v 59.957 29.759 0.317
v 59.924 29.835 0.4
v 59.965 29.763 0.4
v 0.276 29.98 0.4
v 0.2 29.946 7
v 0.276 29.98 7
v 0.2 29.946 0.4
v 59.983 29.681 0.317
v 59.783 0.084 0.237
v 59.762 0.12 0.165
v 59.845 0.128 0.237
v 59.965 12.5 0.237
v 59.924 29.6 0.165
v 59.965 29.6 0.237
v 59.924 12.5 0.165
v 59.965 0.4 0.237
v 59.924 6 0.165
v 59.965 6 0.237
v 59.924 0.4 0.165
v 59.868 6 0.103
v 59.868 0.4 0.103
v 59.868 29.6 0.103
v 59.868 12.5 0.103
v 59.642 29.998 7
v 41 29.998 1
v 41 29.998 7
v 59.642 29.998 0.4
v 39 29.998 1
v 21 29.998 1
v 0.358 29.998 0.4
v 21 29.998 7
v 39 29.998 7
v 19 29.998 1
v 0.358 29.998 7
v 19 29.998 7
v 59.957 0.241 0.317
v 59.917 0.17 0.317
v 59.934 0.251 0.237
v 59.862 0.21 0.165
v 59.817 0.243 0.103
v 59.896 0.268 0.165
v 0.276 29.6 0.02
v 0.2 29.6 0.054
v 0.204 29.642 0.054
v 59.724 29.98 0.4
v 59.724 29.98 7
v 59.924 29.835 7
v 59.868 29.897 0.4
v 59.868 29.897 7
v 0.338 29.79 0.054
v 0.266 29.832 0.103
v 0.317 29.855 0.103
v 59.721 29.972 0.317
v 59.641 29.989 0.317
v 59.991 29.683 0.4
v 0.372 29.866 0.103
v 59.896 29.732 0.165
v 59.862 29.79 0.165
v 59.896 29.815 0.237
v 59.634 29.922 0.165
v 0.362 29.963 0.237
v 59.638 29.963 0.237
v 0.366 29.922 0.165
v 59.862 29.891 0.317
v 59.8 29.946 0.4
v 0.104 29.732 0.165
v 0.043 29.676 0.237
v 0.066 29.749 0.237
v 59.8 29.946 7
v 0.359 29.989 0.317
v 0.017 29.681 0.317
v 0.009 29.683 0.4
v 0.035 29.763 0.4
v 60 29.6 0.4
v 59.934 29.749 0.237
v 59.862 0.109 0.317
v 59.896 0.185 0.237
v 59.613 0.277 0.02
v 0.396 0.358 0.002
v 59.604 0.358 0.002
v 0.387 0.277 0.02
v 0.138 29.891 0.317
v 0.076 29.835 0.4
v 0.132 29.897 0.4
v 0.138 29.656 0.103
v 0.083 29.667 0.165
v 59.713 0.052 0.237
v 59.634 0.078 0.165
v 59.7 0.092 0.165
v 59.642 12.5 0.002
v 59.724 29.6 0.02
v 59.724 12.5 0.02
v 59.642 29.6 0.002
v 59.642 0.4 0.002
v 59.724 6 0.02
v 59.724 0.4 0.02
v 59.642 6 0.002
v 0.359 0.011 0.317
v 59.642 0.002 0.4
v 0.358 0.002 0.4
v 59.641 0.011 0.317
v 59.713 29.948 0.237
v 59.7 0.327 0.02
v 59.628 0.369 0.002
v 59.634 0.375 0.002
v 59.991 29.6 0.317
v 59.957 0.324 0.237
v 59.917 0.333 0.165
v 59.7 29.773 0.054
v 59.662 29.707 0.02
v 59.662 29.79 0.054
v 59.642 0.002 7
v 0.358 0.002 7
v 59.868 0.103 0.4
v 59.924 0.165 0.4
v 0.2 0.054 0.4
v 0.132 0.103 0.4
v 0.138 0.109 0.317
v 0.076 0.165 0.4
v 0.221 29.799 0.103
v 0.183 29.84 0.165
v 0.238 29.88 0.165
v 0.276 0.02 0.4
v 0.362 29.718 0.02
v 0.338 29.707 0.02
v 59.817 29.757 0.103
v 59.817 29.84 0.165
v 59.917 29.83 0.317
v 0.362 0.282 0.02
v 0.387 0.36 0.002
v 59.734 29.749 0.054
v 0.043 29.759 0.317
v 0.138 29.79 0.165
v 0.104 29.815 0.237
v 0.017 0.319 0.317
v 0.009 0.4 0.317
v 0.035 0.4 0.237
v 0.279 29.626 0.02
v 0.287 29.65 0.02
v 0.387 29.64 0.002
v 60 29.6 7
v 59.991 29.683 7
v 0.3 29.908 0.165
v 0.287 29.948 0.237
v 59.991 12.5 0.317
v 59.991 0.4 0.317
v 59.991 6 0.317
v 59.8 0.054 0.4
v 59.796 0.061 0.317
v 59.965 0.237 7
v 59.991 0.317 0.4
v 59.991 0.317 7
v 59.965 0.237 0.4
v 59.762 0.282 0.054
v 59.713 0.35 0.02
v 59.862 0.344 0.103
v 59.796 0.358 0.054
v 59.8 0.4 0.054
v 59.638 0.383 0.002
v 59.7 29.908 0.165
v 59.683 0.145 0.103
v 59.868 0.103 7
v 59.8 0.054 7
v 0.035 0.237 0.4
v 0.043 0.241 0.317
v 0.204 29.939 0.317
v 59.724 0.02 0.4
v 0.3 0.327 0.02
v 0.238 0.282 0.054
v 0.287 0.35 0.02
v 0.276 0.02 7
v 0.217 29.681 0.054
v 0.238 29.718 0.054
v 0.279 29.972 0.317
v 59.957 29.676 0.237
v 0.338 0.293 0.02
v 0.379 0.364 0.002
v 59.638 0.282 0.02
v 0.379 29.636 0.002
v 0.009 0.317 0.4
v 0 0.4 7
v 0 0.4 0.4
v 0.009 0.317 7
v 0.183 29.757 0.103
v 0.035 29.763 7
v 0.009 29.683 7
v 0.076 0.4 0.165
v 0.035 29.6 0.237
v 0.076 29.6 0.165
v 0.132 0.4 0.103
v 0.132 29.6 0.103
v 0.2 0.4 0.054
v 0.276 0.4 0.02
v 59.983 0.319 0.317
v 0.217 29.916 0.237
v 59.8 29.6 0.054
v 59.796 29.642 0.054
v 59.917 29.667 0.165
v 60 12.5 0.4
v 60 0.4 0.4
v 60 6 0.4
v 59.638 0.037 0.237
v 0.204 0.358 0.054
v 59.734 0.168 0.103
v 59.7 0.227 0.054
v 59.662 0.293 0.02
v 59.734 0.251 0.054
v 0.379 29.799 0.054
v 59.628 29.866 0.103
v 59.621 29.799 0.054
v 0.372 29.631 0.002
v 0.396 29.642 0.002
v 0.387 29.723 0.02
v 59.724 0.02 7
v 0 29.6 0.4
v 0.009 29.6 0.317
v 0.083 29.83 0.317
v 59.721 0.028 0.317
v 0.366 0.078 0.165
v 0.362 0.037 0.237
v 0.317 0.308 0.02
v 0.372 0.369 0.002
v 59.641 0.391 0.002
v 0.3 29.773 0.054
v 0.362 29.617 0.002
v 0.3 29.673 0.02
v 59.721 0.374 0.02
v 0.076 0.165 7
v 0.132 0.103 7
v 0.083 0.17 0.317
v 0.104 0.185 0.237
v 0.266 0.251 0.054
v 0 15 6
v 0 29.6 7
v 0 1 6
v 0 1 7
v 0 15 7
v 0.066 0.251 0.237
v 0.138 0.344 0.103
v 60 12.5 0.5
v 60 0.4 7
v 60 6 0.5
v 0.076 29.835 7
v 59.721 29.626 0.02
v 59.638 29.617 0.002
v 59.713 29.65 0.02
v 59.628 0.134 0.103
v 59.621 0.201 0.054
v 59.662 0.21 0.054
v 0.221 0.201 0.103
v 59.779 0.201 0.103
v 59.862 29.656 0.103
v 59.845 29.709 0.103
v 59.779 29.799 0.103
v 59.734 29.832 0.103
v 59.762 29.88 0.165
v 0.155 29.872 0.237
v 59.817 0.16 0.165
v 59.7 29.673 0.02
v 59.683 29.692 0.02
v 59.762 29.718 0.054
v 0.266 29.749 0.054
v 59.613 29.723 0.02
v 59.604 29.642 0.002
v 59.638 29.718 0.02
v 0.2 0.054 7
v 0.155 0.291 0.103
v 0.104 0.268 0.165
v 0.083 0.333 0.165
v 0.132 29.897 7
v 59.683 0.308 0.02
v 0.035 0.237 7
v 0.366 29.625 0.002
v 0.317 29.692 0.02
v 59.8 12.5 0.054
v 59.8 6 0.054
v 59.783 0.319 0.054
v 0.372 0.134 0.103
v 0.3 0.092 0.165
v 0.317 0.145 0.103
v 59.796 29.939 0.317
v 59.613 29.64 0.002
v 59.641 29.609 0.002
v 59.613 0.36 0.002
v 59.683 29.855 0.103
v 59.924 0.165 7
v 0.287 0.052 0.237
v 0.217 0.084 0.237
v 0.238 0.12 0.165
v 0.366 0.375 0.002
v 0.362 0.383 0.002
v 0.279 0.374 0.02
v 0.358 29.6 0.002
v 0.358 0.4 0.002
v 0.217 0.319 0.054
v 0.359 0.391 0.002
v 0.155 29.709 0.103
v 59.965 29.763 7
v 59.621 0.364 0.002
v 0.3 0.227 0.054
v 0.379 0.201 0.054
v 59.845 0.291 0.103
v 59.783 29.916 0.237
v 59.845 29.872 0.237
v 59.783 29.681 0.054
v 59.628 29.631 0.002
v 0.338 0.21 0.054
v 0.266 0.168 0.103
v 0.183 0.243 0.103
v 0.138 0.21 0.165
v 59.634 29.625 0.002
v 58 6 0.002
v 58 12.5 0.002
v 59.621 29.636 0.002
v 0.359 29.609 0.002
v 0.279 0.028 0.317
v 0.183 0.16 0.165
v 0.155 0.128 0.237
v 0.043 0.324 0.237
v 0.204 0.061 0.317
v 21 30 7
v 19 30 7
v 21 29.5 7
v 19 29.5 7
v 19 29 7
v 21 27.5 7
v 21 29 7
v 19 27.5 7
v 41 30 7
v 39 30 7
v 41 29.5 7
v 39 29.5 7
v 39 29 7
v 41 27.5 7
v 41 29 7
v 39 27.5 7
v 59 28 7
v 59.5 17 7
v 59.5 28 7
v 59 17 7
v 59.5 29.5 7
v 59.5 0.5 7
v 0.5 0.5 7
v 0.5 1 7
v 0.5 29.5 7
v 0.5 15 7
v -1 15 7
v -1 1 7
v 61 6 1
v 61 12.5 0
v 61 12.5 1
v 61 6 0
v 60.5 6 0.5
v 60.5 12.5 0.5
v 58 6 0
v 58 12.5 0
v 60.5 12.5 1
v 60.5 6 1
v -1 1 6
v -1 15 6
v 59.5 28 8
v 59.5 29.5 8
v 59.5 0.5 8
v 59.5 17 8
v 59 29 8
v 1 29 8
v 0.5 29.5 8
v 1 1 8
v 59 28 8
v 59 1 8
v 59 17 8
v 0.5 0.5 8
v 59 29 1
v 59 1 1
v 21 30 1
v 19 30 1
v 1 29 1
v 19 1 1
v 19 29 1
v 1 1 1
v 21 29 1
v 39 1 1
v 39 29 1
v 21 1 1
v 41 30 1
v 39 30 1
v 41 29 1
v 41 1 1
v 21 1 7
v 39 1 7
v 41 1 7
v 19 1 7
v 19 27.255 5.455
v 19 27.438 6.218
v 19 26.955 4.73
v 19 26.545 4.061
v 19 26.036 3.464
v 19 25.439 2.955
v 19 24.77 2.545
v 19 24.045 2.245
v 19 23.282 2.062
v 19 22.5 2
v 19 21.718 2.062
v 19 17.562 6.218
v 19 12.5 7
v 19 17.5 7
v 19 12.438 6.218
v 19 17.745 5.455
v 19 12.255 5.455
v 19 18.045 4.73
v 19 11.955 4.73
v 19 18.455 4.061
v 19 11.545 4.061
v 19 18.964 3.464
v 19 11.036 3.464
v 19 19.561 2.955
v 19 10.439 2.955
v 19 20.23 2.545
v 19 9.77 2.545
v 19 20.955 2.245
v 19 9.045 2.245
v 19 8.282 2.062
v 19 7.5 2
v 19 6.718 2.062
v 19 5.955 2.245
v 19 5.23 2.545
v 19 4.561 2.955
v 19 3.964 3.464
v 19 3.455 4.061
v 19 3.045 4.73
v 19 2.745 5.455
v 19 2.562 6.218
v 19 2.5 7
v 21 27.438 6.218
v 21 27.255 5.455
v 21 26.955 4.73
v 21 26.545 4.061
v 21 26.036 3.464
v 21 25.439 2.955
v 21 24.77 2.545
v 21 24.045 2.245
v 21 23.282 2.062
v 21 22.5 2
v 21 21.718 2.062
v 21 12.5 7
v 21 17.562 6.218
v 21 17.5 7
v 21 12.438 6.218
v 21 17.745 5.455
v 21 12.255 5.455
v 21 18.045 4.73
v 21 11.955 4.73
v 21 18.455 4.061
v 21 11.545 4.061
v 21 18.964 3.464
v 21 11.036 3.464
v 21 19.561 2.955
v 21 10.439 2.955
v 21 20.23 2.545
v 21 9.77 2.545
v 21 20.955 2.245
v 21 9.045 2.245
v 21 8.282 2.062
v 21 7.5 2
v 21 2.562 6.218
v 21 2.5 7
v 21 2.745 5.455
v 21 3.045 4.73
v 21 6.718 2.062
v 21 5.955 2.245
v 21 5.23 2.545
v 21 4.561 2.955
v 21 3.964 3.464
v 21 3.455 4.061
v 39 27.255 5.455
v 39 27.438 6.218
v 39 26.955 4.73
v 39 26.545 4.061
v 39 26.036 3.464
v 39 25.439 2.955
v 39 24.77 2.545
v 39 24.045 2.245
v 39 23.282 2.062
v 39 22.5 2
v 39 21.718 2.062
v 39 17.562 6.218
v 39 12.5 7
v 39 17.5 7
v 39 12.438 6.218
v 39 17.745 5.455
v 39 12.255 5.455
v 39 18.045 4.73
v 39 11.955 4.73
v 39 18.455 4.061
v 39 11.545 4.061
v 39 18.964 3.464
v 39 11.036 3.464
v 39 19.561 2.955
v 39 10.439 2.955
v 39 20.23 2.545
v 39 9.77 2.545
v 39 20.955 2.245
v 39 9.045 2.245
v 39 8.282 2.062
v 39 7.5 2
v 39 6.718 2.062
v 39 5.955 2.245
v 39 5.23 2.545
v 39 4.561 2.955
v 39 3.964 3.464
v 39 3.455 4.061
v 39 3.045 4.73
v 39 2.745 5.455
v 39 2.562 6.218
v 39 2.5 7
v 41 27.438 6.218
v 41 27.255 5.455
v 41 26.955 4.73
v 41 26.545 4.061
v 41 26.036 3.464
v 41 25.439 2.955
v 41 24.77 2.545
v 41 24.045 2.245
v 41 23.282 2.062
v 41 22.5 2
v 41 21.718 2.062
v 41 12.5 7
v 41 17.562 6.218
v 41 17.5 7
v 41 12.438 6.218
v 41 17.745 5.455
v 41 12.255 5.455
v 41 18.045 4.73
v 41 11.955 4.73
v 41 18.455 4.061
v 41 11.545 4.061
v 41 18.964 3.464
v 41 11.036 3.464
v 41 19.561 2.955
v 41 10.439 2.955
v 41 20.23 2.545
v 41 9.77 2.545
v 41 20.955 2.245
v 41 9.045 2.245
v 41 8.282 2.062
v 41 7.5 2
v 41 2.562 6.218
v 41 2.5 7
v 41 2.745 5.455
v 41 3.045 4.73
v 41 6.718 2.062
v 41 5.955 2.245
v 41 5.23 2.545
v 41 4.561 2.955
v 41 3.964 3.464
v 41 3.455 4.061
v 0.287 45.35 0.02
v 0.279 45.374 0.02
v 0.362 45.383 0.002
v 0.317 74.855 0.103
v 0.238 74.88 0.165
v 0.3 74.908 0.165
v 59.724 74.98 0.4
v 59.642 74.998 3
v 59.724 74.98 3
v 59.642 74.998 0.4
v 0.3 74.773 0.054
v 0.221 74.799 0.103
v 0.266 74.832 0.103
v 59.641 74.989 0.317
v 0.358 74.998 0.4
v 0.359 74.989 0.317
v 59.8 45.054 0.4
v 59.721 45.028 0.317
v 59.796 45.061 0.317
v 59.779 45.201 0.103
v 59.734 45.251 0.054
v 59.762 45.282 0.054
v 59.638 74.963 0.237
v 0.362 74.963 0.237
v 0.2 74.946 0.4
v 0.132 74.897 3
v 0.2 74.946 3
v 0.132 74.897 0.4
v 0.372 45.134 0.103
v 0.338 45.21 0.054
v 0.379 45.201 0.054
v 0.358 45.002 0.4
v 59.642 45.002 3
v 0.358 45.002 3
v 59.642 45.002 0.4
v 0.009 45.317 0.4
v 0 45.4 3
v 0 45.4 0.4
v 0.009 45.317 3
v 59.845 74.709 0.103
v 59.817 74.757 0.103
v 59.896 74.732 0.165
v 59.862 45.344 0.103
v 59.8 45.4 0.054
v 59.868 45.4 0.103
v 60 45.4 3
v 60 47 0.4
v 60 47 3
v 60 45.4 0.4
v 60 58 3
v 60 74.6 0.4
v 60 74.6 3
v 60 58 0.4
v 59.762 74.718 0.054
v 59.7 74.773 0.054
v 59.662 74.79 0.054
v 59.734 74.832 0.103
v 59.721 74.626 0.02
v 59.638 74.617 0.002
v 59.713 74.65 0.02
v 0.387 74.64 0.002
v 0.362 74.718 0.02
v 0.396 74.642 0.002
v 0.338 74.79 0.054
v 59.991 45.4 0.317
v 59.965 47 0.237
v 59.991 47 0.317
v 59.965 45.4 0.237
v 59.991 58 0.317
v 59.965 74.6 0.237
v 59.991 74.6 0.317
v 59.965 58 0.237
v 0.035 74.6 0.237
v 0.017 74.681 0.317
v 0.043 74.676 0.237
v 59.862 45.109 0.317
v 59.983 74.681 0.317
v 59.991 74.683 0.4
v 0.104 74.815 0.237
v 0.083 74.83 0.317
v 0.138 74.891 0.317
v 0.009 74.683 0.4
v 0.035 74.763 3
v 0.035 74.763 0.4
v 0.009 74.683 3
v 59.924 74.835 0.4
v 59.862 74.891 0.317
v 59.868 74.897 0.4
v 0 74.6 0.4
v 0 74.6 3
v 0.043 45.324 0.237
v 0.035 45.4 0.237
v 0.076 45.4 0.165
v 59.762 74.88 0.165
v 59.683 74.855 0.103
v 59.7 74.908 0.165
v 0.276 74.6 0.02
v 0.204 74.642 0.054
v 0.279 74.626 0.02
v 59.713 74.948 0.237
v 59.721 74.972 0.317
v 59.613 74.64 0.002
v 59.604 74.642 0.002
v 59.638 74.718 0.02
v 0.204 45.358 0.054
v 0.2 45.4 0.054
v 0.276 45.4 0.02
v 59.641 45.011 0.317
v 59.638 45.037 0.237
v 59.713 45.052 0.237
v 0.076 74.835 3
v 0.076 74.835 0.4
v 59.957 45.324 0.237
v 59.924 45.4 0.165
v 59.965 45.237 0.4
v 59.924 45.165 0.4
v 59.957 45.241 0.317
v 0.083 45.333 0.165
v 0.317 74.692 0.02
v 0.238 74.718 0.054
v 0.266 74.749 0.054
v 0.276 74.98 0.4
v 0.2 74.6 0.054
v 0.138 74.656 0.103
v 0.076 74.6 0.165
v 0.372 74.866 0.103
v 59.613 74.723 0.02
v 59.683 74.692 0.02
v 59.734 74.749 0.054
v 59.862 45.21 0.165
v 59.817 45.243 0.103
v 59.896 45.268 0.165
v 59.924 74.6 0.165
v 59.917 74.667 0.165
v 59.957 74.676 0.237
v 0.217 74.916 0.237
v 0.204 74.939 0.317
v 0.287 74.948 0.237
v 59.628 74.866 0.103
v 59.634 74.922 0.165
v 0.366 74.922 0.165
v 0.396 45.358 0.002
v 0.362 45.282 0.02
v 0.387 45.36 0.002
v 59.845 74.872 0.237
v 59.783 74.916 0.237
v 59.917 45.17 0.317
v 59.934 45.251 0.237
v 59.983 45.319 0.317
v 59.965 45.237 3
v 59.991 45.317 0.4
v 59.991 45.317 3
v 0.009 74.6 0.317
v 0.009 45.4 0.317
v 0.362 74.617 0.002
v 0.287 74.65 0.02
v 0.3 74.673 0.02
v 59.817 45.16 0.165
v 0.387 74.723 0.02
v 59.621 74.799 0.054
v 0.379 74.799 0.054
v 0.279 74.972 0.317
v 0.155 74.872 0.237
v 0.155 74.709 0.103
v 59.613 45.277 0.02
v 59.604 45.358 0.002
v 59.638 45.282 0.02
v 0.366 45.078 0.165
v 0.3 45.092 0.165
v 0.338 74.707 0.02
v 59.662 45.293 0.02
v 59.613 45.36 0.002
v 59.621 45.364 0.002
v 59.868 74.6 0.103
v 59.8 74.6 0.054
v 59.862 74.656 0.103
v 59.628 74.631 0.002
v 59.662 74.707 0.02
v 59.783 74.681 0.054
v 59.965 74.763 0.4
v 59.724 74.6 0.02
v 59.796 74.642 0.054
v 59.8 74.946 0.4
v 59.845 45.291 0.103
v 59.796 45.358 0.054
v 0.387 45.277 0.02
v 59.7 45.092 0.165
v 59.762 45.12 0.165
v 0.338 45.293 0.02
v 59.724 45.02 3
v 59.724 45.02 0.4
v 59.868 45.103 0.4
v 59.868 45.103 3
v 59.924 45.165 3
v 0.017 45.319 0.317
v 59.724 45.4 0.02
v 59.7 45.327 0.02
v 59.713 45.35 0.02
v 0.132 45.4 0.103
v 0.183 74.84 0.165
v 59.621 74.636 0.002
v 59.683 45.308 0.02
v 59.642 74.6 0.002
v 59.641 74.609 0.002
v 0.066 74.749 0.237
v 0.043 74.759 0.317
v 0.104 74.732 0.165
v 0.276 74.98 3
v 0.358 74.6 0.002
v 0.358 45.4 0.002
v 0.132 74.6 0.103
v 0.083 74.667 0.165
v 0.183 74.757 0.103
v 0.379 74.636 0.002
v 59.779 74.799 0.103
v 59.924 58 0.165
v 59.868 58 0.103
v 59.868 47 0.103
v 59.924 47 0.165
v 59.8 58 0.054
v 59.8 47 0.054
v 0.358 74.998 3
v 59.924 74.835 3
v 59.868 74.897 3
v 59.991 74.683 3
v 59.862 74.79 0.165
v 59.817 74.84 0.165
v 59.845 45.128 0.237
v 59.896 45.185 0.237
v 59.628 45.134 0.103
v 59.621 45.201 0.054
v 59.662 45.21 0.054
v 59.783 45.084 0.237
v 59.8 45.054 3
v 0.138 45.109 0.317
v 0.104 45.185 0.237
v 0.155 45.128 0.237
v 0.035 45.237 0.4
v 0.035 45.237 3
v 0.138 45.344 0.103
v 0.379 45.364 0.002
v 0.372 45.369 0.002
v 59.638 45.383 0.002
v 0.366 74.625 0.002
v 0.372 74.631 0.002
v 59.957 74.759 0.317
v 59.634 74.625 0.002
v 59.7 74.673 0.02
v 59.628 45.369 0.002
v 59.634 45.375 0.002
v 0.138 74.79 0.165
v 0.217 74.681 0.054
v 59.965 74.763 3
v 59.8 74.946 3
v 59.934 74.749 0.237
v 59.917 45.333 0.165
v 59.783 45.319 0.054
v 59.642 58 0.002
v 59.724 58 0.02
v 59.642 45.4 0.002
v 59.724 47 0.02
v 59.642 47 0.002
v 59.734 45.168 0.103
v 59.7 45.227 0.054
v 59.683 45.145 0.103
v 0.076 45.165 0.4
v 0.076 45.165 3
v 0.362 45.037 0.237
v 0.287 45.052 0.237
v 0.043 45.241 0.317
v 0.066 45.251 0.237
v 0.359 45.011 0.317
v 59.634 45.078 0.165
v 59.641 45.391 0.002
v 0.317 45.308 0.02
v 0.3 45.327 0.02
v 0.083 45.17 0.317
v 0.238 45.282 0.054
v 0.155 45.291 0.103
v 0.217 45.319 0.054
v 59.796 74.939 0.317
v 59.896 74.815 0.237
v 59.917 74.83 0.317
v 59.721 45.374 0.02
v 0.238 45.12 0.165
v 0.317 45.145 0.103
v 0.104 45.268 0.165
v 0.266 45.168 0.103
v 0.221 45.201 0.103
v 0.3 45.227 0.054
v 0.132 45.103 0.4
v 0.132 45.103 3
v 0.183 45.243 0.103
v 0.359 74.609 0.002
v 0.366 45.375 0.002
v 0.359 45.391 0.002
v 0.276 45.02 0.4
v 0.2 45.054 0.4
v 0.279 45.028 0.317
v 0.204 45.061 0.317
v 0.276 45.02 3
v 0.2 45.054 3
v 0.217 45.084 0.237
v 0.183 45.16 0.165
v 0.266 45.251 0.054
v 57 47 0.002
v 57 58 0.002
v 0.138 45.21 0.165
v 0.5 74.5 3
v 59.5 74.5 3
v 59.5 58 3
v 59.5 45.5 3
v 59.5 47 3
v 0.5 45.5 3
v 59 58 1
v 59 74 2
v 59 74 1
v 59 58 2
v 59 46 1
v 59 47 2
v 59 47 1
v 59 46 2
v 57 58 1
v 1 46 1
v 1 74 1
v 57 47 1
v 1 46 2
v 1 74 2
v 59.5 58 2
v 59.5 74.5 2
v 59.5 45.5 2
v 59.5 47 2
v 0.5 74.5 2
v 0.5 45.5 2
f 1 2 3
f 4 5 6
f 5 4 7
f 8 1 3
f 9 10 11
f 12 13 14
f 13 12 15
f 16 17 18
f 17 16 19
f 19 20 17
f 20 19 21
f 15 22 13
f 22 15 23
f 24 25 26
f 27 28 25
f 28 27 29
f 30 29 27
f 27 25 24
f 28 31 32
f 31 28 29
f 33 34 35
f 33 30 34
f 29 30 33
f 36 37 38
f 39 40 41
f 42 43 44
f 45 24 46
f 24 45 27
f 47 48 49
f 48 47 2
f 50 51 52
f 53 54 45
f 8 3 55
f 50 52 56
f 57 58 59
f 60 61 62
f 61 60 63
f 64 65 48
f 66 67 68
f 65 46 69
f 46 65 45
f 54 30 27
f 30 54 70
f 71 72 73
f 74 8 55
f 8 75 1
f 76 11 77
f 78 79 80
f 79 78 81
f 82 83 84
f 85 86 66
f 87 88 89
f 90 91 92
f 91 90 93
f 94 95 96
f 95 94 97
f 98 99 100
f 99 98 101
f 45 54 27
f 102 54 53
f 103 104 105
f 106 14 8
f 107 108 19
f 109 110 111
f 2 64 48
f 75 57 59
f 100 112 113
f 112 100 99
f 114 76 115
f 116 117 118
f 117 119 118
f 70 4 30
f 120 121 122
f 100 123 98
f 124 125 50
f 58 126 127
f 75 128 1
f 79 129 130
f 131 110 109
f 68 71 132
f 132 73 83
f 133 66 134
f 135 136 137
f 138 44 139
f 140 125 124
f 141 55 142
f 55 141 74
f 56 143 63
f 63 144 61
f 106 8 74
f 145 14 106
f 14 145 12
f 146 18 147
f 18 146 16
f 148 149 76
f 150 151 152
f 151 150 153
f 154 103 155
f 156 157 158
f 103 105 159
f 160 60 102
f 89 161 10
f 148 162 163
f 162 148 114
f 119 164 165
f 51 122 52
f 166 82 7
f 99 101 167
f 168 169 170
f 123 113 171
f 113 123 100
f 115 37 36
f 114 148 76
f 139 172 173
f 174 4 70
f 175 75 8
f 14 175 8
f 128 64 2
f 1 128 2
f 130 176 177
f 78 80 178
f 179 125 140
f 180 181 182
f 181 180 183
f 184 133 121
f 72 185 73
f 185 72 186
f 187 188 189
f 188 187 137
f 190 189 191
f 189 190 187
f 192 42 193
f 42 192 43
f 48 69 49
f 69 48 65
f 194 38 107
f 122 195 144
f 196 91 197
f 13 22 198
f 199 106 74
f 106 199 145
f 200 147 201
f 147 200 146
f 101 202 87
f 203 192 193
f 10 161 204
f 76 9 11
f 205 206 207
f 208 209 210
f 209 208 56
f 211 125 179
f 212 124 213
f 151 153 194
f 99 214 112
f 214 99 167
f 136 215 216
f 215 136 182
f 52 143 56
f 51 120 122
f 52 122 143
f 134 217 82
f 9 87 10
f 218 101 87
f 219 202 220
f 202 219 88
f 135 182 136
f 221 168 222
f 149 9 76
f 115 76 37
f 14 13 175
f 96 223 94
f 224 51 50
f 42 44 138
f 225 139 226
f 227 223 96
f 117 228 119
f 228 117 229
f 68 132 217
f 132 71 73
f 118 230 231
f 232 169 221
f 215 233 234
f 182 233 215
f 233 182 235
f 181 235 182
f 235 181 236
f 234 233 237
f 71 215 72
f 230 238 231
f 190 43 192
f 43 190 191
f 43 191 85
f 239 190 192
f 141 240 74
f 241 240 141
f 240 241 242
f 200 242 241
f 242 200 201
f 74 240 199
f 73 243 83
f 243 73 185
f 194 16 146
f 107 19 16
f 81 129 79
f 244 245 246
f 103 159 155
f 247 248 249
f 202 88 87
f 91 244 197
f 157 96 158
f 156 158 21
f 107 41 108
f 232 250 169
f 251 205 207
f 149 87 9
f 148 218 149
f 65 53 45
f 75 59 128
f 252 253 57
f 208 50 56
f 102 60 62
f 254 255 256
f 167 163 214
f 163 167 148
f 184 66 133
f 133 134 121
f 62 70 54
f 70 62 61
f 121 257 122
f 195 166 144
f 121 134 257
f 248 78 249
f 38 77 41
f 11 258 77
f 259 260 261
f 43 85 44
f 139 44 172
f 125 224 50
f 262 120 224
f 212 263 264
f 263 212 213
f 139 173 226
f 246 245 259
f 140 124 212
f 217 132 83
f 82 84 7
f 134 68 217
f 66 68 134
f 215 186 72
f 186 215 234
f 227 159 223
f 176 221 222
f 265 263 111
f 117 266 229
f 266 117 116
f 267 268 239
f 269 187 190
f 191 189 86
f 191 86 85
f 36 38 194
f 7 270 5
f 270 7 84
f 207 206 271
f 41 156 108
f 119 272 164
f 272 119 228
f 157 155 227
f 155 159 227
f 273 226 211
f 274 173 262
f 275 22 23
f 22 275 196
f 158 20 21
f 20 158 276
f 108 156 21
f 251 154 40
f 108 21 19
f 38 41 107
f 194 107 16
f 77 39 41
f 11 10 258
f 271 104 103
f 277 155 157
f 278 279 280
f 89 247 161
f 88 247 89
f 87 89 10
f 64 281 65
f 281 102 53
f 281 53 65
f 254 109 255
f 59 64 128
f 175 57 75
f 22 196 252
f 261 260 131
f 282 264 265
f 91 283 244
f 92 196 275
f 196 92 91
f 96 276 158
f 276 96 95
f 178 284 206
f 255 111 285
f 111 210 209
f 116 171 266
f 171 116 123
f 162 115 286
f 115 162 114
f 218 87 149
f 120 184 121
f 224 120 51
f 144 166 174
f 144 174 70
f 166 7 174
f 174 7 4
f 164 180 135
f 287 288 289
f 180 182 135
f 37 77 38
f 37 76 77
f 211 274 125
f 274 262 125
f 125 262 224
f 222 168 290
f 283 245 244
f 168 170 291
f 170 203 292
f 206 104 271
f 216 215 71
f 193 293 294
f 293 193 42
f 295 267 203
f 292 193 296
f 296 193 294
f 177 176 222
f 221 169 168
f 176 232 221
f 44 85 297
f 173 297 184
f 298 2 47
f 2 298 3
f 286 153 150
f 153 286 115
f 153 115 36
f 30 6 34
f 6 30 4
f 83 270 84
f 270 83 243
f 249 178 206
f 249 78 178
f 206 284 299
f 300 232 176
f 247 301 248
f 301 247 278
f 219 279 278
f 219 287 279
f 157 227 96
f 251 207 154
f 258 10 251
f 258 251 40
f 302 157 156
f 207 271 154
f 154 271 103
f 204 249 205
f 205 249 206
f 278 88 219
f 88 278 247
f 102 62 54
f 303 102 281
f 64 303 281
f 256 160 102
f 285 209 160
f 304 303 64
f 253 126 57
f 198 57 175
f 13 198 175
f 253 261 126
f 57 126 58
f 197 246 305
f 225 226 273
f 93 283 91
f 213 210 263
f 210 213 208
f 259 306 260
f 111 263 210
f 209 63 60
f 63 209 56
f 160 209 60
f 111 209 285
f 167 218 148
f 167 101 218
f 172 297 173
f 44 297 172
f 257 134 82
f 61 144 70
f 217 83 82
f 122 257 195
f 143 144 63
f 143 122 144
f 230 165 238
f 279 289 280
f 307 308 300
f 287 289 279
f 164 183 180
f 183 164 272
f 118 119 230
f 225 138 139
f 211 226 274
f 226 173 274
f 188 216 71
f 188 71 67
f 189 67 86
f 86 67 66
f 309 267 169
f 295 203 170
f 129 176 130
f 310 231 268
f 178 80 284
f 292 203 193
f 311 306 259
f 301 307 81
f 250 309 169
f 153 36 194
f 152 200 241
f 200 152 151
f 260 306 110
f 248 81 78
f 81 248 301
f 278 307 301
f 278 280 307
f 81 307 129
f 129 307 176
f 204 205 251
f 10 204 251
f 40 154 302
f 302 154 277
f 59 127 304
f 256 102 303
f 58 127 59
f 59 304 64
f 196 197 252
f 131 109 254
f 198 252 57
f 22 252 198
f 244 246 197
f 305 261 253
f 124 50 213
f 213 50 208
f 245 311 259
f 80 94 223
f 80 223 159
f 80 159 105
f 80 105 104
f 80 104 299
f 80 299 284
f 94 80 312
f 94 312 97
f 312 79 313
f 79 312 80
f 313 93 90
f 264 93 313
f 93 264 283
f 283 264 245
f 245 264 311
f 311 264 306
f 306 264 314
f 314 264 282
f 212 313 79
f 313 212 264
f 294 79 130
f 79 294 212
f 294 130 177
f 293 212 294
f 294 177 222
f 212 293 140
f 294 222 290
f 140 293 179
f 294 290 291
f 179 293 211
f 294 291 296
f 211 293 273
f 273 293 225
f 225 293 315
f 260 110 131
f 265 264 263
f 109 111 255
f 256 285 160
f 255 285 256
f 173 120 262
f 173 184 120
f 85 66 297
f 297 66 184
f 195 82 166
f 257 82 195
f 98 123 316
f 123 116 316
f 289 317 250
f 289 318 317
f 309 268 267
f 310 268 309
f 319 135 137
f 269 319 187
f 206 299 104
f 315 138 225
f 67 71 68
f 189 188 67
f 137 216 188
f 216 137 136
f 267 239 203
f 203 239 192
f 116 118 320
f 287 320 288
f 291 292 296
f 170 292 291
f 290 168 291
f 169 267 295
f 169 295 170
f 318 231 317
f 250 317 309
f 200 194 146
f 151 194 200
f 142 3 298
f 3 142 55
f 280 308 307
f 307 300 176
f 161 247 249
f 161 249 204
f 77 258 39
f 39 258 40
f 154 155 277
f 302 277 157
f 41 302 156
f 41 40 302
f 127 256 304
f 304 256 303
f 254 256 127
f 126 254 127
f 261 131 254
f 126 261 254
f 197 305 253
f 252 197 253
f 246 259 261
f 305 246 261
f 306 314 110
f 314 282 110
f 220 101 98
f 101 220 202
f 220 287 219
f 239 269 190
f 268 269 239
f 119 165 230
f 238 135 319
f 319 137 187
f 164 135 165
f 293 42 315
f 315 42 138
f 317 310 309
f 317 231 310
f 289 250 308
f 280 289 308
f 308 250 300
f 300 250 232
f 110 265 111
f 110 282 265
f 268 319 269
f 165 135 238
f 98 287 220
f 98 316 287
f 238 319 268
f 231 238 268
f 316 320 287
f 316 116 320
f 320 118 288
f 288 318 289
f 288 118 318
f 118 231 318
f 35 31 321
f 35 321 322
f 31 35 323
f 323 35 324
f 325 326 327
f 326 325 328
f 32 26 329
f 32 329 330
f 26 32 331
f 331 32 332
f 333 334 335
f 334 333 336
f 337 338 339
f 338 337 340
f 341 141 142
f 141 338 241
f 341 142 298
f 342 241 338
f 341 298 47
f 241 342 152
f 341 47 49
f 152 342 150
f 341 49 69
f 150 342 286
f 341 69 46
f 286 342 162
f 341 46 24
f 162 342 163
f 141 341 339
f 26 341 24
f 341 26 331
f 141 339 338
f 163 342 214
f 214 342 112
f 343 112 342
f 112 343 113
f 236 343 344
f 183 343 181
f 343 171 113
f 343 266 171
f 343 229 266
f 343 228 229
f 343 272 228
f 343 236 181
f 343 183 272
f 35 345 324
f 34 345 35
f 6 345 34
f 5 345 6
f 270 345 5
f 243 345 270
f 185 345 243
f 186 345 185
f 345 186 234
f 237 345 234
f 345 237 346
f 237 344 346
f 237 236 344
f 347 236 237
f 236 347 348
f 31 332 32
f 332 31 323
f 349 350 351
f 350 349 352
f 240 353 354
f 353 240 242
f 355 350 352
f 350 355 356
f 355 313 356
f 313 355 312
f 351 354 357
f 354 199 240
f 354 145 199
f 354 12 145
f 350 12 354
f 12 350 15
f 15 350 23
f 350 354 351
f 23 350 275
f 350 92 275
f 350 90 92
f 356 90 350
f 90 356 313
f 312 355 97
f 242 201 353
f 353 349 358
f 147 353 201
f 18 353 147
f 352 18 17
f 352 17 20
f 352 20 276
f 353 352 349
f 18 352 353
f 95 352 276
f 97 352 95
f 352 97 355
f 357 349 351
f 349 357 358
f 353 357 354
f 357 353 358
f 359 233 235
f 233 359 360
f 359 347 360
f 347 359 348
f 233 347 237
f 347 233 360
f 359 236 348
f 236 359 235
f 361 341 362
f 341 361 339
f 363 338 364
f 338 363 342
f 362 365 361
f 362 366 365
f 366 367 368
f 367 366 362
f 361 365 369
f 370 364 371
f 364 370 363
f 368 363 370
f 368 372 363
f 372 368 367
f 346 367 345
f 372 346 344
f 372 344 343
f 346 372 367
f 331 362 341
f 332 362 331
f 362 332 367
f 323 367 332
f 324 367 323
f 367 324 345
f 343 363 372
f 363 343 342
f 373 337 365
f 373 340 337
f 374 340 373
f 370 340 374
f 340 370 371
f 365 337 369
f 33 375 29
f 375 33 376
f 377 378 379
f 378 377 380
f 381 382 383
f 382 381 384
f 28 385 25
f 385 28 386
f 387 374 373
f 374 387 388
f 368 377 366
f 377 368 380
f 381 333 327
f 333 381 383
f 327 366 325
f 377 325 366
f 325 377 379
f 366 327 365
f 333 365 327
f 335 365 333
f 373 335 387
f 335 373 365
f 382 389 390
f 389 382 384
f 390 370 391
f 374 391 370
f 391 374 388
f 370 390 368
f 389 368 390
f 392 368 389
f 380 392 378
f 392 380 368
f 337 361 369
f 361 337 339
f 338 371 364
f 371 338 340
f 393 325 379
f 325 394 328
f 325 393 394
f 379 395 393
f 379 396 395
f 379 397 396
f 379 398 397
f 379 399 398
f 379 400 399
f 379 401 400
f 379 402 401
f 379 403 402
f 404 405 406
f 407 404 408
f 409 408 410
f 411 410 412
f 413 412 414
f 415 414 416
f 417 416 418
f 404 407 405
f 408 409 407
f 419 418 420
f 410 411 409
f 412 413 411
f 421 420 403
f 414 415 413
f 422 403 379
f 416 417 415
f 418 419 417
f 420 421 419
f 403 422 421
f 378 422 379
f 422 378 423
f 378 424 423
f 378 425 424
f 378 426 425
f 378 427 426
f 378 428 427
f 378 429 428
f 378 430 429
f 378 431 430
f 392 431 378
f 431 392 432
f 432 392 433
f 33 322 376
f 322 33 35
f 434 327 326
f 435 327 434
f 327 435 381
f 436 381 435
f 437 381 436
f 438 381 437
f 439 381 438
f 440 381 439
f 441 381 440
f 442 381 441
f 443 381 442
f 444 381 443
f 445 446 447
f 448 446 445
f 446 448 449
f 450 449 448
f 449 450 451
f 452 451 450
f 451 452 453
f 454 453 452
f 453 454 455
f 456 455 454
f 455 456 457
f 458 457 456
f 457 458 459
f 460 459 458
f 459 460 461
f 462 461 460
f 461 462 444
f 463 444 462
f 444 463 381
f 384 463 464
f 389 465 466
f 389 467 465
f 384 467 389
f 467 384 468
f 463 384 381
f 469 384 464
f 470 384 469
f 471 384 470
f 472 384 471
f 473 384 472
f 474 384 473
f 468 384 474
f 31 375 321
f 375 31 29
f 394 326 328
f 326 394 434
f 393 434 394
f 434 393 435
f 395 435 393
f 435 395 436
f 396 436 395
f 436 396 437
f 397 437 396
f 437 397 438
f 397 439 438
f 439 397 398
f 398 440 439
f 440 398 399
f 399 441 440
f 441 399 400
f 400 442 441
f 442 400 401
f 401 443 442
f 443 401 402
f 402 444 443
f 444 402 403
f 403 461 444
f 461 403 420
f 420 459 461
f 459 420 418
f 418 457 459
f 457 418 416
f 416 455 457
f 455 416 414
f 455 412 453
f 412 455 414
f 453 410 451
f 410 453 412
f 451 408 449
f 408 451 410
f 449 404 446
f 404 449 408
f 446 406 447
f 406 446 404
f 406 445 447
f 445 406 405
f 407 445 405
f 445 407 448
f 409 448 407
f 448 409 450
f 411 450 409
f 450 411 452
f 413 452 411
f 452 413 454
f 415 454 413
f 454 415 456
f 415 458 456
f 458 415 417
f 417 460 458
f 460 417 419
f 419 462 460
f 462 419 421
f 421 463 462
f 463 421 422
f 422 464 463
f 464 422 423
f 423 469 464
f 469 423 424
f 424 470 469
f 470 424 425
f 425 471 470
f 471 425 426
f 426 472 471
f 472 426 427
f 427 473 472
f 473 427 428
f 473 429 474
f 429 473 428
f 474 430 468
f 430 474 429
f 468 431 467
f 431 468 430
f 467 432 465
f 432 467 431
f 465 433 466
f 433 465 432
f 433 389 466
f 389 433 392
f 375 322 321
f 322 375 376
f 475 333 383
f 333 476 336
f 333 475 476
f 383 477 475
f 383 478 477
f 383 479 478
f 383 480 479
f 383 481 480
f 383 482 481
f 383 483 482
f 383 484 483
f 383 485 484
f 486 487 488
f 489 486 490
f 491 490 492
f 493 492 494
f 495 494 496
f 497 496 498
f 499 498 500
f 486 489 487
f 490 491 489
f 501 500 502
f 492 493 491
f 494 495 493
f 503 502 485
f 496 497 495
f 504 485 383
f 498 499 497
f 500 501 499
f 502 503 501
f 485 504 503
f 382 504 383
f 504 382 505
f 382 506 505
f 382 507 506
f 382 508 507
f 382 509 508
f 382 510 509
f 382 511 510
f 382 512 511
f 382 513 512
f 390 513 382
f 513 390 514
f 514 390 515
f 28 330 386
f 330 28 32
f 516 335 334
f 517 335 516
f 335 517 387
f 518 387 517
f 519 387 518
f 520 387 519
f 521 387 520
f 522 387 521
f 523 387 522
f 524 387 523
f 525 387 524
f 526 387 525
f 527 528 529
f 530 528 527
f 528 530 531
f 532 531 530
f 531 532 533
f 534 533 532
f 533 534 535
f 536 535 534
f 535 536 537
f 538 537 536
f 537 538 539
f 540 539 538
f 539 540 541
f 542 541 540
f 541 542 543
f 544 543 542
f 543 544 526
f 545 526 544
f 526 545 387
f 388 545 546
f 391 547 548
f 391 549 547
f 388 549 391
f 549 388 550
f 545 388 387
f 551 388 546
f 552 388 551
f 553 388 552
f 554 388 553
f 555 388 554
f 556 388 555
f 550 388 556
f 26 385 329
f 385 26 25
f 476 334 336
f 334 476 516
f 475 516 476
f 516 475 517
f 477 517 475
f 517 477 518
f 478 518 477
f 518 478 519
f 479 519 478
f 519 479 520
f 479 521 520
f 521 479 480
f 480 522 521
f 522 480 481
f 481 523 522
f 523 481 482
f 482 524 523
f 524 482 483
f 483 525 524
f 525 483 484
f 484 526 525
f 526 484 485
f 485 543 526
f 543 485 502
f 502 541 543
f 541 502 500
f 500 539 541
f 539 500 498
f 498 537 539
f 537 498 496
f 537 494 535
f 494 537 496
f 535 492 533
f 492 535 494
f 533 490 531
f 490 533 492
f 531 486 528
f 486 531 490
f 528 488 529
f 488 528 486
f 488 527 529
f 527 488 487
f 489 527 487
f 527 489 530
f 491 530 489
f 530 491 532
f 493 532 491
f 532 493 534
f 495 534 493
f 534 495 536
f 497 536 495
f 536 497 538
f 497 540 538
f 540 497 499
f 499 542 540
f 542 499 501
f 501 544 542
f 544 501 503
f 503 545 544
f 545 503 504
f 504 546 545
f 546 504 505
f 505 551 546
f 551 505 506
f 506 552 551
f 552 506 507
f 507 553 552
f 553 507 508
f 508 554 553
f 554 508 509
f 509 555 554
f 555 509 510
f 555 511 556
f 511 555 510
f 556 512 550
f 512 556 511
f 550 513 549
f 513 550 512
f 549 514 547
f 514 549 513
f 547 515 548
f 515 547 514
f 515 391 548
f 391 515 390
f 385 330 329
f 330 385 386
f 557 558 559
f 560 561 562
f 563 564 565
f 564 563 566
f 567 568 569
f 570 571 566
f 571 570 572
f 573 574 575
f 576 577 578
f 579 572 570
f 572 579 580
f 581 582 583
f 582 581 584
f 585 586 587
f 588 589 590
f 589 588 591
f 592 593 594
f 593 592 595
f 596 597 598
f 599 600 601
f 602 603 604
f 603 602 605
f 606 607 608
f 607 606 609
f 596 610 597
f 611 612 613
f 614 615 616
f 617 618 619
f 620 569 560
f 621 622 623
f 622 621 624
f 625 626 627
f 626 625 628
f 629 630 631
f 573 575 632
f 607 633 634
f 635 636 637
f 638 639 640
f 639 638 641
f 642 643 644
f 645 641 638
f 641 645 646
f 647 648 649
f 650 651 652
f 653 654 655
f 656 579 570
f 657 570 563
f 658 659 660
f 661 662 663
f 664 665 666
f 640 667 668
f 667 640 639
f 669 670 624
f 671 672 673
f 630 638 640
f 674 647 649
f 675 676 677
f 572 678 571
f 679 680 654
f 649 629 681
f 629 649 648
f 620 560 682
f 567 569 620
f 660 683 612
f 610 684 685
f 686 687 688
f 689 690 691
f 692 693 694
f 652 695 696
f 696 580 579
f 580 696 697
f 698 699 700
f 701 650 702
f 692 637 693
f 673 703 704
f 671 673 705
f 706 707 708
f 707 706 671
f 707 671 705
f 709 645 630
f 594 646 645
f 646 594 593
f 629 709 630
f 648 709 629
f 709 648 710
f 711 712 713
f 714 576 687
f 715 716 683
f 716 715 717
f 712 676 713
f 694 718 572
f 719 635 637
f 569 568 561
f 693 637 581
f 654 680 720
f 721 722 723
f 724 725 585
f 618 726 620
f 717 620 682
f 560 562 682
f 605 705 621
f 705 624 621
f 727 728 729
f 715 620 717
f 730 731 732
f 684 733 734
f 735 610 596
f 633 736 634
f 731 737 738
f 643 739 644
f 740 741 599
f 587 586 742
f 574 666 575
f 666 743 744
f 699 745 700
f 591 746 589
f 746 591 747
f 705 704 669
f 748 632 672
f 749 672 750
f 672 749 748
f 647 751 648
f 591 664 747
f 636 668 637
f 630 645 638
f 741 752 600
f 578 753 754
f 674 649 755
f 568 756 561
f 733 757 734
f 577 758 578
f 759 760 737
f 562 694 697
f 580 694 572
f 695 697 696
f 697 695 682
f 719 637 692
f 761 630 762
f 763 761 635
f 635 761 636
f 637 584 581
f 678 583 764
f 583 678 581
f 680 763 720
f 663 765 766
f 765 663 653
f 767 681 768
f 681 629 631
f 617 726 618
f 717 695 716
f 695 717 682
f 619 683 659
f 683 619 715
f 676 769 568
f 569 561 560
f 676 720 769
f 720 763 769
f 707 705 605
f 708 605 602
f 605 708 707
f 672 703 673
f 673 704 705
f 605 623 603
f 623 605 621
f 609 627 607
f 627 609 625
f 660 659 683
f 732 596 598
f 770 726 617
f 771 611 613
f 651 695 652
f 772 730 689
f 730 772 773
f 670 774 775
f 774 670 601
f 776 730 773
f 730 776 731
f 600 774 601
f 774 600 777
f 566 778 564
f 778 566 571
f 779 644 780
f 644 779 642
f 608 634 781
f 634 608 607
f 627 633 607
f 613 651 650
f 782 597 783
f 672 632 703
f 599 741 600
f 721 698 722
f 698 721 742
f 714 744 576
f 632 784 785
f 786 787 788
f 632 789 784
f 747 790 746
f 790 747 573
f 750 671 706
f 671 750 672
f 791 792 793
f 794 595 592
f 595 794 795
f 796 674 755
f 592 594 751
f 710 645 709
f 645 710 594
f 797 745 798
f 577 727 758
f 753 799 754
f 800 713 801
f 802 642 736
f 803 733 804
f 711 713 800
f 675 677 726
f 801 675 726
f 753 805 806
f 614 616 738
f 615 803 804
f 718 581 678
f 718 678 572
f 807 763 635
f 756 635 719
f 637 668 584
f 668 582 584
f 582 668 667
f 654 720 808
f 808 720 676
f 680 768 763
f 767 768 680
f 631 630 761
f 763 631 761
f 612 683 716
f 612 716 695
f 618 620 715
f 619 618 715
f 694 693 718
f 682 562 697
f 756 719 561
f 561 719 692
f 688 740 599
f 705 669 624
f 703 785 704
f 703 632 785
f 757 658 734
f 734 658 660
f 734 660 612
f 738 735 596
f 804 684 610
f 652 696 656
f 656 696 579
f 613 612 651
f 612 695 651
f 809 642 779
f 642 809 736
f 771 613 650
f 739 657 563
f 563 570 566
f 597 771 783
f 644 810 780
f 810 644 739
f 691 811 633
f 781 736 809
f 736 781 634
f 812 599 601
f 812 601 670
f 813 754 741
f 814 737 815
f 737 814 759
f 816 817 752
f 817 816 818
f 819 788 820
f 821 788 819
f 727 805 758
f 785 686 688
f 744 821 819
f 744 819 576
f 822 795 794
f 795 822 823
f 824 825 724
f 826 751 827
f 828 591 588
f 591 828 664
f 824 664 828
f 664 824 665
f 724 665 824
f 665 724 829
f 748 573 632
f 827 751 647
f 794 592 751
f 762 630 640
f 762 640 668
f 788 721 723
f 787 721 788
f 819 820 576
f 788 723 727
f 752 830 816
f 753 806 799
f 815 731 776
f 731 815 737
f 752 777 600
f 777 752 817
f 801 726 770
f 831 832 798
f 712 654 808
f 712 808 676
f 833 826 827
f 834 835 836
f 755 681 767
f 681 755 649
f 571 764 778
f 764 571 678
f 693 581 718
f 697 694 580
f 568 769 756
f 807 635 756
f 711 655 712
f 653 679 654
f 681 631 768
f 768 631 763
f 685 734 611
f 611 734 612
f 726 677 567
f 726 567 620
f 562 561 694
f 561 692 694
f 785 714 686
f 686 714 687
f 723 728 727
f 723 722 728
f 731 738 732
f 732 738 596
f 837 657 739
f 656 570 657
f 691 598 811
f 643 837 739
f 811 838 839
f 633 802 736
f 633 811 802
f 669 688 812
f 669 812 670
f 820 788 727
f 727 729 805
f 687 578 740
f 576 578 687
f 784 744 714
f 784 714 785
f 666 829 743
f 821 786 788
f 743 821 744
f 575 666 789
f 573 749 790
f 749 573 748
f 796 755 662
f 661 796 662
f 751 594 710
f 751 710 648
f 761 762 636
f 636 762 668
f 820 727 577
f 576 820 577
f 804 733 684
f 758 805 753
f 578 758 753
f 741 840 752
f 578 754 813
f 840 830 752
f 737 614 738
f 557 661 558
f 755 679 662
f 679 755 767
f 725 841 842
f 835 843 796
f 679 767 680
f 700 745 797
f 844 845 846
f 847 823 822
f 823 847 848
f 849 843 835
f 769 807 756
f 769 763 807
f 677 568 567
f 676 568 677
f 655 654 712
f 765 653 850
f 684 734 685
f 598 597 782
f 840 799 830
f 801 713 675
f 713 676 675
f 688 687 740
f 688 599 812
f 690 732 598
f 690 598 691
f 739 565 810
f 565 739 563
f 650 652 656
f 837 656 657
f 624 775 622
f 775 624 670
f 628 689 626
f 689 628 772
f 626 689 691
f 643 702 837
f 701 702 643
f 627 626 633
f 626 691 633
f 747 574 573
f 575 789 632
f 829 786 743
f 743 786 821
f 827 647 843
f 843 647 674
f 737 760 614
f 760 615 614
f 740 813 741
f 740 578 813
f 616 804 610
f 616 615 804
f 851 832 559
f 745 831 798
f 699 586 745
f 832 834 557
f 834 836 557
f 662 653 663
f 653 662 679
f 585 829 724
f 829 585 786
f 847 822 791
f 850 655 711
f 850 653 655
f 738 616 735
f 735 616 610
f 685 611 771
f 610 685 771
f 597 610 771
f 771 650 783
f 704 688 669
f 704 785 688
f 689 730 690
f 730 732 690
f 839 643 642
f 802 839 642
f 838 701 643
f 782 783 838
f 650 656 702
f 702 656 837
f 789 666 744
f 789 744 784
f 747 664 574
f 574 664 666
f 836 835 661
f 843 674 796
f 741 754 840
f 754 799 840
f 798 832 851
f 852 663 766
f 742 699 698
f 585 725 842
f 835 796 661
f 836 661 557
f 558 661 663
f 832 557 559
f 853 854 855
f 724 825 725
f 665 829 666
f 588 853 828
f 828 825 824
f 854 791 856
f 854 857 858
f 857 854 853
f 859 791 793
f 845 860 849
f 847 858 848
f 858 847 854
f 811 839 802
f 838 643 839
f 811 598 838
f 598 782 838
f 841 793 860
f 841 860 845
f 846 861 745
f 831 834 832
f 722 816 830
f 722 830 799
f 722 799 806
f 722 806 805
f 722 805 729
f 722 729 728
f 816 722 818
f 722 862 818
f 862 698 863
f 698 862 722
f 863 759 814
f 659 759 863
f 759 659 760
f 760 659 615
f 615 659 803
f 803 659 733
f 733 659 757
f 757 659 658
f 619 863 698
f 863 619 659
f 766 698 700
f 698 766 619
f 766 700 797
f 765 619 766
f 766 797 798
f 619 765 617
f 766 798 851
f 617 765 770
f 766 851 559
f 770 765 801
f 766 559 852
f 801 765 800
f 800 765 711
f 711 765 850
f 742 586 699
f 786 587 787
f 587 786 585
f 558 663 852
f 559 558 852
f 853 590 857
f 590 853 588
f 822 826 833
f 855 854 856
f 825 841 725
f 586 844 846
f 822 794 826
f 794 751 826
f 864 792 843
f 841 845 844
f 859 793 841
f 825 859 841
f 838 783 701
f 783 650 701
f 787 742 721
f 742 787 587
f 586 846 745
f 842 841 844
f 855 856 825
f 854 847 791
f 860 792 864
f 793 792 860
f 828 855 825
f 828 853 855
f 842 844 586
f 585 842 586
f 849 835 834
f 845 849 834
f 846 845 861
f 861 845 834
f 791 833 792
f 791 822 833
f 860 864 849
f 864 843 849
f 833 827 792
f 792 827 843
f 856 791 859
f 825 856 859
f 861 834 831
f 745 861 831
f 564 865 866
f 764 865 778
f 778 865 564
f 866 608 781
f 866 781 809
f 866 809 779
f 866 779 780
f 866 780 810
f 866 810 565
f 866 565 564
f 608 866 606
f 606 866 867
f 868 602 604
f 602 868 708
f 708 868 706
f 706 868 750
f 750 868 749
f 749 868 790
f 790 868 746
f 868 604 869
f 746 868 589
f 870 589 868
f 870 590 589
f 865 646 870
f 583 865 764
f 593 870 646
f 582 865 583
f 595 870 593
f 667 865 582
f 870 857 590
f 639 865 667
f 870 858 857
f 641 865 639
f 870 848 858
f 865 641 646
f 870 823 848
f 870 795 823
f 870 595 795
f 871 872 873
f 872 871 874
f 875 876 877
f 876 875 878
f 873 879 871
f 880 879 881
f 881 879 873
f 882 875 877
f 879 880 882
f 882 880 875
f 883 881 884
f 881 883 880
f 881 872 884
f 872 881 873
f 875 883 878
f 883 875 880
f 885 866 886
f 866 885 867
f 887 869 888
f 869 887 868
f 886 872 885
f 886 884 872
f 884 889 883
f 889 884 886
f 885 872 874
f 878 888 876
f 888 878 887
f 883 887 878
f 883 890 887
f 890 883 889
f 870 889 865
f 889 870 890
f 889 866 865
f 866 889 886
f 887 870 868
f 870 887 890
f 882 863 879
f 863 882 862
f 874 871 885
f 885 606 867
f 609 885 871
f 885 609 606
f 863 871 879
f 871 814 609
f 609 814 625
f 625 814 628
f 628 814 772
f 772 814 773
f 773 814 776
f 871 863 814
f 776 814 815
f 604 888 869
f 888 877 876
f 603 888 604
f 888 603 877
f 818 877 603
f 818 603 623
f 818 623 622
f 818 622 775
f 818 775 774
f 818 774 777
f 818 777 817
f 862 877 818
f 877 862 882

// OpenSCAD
/******************************************************************
  Polaroid™ Pogo™ ZINK™ paper printer battery pack adapter/housing

  Polaroid™ Part-# 2ATL462849 ALP (Polaroid)
                   2ATL462849 DLL (Dell)
  Dell™ Part-# D4487

  for Polaroid Pogo™ () / Dell Wasabi™ (PZ310)
  +++++++++++++++++++++++++++++++++++++++++++++++++++++++++++++++++
  Copyright (C) by XA, V 2022. All rights reserved.
  *****************************************************************

  Connector:  __/ - - T CHG+ + + \___________

*/

// Tray
dxTray = 60;
dyTray = 30;
dzTray = 7;

// Top
dzTop = 3;

// Connector
dxConn = 3;
dyConn = 11;
yConn = 17;

//
radCorners = 0.4;
wdLatch = 1;

thWall = 1;
thWallThin = .5;
thFlap = 1;


/* ******** */

module rounded_cube(size, radius=-1, center=false) {
    assert(len(size) == 3, "size must be vector");
    if (radius == 0) {
        cube(size, center=center);
    } else {
        let (radius = (radius == -1)? ceil((size.x + size.y + size.z)/3)/10 : radius) {
            minkowski() {
                translate([radius, radius, radius]) cube(size - 2*[radius, radius, radius], center=center);
                sphere(radius);
            }
        }
    }
}

/* ******** */

module tray_outer (size, wdLatch=0, radius=-1, noFlaps=false) {
    assert(len(size) == 3, "size must be vector");
    plus = (radius <= 0)? max(size.z/4, 4): radius*2;
    ovr = 2; // overlap
    union () {
        // exaggerate z height and cut off to correct size to counter rounded edges
        difference() {
            rounded_cube([size.x, size.y, size.z+wdLatch+plus], radius);
            translate([-ovr, -ovr, size.z]) cube([size.x+2*ovr, size.y+2*ovr, wdLatch+1.5*plus]);
        };
        if (wdLatch > 0) {
            // stack wdLatch high latch slice on top
            wdVoid = thWall-thWallThin;
            translate ([wdVoid, wdVoid, size.z])
                cube([size.x-2*wdVoid, size.y-2*wdVoid, wdLatch]);
        };
        if (!noFlaps) {
            /// flaps
            dxFlap = 1;
            dyFlapA = 6.5;
            dyFlapB = 14;
            // connector side flap
            translate([dxTray-ovr, 6, 0])
                union() {
                    cube([dxFlap+ovr, dyFlapA, thWallThin]);
                    translate([ovr+.5, 0, 0])
                        cube([dxFlap-.5, dyFlapA, thFlap]);
                };
            // bottom side flap
            translate([-dxFlap, 1, dzTray-max(thWall,1)]) {
                cube([dxFlap+min(ovr, thWall), dyFlapB, thFlap]);
            };
        };
    };
}

module tray_inner (size, wdLatch=0, thWall=thWall) {
    assert(len(size) == 3, "size must be vector");
    if (wdLatch >= 0) {
        // extend z by latch width
        translate([thWall, thWall, thWall])
            cube([size.x - 2*thWall, size.y - 2*thWall, size.z+wdLatch]);
    } else {
        // thicken by thWallThin from top down by latch width
        wdVoid = thWall-thWallThin;
        union () {
            translate([thWall, thWall, thWall])
                cube([size.x - 2*thWall, size.y - 2*thWall, size.z+(-wdLatch)/2]);
            translate([wdVoid, wdVoid, size.z-(-wdLatch)])
                cube([size.x - 2*wdVoid, size.y - 2*wdVoid, (-wdLatch)]);
        };
    }
}

module seating_AAA (size, thWall=thWall, radius=5) {
    assert(len(size) == 3, "size must be vector");
    translate([-thWall,0,0])
    rotate([90,0,90])
    linear_extrude(height=thWall*2) {
        difference() {
            translate([thWall,thWall]) square([size.y-thWall, size.z-thWall]);
            //translate([radius+3, radius+2]) circle(r=radius);
            //translate([size.y-radius-3, radius+2]) circle(r=radius);
            translate([size.y/4, radius+2]) circle(r=radius);
            translate([size.y/4*3, radius+2]) circle(r=radius);
        }
    }
}


/* ******** */
/* ******** */


// tray
color("LightSkyBlue")
union () {
    union() {
      difference() {
        tray_outer([dxTray, dyTray, dzTray], wdLatch=wdLatch, radius=radCorners, $fn=30);
        tray_inner([dxTray, dyTray, dzTray], wdLatch=wdLatch);
        // connector cutout
        translate([dxTray-dxConn, yConn, dzTray])
           cube([dxConn*2, dyConn, dzTop*2]);
      };
      translate([dxTray/3,0,0]) seating_AAA([dxTray, dyTray, dzTray], $fn=40);
      translate([dxTray/3*2,0,0]) seating_AAA([dxTray, dyTray, dzTray], $fn=40);
    };
};

// top
yTop = dyTray + 15;
color("LightBlue")
translate([0, yTop, 0])
union () {
    // basic top
    union() {
      difference() {
        tray_outer([dxTray, dyTray, dzTop], radius=radCorners, noFlaps=true, $fn=30);
        tray_inner([dxTray, dyTray, dzTop], wdLatch=-wdLatch);
        // connector cutout
        translate([dxTray-dxConn, dyTray-yConn-dyConn, 0])
           cube([dxConn*2, dyConn, dzTop*2]);
      };
    };
};
